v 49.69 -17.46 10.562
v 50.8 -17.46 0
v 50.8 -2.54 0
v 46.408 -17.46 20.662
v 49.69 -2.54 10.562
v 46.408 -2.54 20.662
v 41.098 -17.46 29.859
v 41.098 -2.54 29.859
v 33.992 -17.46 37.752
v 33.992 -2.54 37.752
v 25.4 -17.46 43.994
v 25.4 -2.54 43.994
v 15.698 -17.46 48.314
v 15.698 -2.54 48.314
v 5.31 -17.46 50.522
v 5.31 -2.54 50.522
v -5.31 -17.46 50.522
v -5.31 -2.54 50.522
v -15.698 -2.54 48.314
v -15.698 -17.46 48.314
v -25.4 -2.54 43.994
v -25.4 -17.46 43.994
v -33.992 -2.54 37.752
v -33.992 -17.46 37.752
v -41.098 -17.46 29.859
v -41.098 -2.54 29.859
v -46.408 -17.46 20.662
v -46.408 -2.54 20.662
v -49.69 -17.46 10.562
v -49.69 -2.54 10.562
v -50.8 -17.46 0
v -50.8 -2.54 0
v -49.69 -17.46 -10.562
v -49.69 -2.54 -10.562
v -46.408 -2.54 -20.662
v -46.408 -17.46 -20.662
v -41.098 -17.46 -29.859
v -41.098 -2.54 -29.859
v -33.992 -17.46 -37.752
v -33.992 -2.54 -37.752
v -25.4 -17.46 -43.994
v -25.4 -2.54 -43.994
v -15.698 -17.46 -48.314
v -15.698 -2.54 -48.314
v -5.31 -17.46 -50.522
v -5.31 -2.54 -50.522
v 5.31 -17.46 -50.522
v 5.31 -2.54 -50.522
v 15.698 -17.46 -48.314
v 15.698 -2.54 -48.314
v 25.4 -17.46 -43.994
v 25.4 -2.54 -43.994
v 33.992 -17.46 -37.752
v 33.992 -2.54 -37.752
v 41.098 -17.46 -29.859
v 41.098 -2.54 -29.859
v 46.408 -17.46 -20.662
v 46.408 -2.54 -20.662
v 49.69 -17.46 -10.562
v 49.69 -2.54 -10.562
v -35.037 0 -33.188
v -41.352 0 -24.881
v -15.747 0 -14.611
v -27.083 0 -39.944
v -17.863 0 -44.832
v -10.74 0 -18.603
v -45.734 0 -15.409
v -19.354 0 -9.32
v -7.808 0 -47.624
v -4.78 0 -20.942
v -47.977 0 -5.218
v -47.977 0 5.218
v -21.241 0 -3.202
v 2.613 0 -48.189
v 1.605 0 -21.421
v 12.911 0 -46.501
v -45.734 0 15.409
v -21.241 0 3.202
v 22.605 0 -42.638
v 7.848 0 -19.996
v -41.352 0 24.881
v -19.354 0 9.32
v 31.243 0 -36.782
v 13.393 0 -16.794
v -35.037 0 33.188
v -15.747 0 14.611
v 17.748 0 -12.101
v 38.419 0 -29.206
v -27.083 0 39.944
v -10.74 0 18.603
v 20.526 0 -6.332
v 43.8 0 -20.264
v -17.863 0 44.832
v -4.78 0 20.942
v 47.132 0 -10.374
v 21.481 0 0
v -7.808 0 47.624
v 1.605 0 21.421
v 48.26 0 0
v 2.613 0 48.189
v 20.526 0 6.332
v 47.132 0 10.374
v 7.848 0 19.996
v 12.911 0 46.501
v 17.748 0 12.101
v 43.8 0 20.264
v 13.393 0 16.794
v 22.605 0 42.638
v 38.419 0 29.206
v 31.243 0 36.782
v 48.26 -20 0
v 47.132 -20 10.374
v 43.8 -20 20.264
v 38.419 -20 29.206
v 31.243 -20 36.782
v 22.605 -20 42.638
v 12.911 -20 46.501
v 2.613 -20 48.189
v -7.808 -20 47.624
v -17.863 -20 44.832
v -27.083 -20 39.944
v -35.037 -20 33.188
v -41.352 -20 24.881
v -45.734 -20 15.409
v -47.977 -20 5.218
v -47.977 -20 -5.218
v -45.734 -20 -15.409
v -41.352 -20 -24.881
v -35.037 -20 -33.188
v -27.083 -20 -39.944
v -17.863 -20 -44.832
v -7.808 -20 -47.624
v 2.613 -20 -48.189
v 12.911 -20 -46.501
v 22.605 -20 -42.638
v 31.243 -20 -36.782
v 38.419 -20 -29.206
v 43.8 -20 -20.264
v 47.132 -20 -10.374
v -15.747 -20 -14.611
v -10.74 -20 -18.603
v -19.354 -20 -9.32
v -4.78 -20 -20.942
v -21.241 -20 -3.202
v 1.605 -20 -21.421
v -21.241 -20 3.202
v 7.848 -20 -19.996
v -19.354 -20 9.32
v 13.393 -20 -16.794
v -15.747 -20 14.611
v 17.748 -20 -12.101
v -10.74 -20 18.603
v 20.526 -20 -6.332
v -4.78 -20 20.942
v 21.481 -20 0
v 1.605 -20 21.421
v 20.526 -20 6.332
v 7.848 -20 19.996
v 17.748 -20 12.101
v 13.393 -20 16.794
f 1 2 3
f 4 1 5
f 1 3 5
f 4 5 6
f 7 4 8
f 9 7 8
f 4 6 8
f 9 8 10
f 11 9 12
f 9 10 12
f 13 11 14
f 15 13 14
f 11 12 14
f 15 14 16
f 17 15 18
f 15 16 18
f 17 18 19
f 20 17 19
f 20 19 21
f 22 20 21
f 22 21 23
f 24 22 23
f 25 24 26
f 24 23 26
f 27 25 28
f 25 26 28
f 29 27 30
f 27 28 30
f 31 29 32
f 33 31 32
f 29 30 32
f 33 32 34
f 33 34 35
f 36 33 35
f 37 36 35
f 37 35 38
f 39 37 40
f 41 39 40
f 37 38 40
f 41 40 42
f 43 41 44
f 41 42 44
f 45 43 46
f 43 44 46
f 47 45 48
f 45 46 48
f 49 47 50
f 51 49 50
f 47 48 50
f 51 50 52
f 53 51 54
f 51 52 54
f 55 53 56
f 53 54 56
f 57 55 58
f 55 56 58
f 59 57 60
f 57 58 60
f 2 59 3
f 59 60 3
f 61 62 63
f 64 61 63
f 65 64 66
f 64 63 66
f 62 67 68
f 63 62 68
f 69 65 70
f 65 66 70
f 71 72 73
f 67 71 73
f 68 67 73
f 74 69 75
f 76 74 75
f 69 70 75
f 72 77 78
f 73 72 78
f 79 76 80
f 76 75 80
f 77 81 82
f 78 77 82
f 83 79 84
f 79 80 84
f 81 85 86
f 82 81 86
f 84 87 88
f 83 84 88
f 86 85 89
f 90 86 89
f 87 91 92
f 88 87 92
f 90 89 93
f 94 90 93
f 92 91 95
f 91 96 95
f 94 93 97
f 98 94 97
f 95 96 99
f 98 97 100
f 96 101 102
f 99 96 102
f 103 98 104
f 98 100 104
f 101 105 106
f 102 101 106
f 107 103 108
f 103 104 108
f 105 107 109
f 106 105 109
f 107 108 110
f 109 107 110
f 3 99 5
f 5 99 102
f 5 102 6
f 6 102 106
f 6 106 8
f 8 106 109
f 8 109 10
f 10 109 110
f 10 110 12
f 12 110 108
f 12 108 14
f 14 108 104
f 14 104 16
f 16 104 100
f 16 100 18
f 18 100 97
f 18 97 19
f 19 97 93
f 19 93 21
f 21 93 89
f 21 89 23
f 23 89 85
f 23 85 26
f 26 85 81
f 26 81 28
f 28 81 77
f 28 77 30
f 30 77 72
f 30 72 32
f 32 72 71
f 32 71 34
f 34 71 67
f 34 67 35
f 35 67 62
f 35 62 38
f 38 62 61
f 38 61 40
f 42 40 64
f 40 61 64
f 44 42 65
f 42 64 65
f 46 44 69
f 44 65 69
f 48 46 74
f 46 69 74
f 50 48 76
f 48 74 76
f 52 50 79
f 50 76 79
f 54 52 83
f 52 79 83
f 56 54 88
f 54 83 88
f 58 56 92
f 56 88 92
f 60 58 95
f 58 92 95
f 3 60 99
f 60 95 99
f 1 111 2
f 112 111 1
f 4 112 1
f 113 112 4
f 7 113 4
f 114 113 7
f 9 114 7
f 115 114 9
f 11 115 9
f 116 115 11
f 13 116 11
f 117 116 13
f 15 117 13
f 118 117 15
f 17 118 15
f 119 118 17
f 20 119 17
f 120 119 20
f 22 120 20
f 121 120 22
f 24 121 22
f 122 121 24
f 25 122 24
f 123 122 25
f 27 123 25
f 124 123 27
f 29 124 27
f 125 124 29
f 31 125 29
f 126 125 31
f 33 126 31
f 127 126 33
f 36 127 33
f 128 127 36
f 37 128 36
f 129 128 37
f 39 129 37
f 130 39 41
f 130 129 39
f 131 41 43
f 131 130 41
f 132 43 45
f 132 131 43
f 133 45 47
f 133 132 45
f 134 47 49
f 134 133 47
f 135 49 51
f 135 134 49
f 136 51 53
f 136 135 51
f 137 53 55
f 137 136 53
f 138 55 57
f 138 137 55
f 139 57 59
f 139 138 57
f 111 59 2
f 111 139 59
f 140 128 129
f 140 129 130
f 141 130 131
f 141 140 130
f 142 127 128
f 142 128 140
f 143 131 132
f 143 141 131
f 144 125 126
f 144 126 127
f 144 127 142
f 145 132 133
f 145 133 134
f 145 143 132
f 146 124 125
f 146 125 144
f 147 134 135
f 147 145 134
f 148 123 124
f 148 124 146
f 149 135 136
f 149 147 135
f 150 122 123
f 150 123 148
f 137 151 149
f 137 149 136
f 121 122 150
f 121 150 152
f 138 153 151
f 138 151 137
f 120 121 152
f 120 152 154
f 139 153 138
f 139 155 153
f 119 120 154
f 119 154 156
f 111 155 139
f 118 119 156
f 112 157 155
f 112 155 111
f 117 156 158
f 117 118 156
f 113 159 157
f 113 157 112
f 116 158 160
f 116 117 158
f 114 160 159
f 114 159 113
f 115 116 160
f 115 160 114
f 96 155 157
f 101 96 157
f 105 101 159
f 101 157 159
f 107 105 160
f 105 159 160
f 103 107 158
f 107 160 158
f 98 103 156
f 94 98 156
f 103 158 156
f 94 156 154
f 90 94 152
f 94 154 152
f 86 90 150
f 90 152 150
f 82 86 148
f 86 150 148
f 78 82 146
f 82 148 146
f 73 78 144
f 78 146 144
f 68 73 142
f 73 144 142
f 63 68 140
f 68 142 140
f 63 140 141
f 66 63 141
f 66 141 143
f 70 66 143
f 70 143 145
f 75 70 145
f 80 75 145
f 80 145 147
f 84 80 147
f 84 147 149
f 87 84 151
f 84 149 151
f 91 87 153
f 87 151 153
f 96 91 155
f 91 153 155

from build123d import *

# Parameters (mm, degrees)
F0_R     = 50.8
F1_DEPTH = 20
F3_SIZE  = 2.54
F2_R     = 21.480833
F4_DEPTH = 20


with BuildPart() as f1:
    # F0 (on Front) → F1 (new body)
    with BuildSketch(Plane.XZ):
        Circle(F0_R)
    extrude(amount=F1_DEPTH)

    # F3
    f3_edges = [f1.edges().sort_by_distance(p)[0] for p in [
        (-50.8, -20, 0),
        (-50.8, 0, 0),
    ]]
    chamfer(f3_edges, length=F3_SIZE)

    # F2 (on face) → F4 (cut, through all)
    with BuildSketch(Plane.XZ.offset(20)):
        Circle(F2_R)
    extrude(amount=-F4_DEPTH, mode=Mode.SUBTRACT)


solid = f1.part
